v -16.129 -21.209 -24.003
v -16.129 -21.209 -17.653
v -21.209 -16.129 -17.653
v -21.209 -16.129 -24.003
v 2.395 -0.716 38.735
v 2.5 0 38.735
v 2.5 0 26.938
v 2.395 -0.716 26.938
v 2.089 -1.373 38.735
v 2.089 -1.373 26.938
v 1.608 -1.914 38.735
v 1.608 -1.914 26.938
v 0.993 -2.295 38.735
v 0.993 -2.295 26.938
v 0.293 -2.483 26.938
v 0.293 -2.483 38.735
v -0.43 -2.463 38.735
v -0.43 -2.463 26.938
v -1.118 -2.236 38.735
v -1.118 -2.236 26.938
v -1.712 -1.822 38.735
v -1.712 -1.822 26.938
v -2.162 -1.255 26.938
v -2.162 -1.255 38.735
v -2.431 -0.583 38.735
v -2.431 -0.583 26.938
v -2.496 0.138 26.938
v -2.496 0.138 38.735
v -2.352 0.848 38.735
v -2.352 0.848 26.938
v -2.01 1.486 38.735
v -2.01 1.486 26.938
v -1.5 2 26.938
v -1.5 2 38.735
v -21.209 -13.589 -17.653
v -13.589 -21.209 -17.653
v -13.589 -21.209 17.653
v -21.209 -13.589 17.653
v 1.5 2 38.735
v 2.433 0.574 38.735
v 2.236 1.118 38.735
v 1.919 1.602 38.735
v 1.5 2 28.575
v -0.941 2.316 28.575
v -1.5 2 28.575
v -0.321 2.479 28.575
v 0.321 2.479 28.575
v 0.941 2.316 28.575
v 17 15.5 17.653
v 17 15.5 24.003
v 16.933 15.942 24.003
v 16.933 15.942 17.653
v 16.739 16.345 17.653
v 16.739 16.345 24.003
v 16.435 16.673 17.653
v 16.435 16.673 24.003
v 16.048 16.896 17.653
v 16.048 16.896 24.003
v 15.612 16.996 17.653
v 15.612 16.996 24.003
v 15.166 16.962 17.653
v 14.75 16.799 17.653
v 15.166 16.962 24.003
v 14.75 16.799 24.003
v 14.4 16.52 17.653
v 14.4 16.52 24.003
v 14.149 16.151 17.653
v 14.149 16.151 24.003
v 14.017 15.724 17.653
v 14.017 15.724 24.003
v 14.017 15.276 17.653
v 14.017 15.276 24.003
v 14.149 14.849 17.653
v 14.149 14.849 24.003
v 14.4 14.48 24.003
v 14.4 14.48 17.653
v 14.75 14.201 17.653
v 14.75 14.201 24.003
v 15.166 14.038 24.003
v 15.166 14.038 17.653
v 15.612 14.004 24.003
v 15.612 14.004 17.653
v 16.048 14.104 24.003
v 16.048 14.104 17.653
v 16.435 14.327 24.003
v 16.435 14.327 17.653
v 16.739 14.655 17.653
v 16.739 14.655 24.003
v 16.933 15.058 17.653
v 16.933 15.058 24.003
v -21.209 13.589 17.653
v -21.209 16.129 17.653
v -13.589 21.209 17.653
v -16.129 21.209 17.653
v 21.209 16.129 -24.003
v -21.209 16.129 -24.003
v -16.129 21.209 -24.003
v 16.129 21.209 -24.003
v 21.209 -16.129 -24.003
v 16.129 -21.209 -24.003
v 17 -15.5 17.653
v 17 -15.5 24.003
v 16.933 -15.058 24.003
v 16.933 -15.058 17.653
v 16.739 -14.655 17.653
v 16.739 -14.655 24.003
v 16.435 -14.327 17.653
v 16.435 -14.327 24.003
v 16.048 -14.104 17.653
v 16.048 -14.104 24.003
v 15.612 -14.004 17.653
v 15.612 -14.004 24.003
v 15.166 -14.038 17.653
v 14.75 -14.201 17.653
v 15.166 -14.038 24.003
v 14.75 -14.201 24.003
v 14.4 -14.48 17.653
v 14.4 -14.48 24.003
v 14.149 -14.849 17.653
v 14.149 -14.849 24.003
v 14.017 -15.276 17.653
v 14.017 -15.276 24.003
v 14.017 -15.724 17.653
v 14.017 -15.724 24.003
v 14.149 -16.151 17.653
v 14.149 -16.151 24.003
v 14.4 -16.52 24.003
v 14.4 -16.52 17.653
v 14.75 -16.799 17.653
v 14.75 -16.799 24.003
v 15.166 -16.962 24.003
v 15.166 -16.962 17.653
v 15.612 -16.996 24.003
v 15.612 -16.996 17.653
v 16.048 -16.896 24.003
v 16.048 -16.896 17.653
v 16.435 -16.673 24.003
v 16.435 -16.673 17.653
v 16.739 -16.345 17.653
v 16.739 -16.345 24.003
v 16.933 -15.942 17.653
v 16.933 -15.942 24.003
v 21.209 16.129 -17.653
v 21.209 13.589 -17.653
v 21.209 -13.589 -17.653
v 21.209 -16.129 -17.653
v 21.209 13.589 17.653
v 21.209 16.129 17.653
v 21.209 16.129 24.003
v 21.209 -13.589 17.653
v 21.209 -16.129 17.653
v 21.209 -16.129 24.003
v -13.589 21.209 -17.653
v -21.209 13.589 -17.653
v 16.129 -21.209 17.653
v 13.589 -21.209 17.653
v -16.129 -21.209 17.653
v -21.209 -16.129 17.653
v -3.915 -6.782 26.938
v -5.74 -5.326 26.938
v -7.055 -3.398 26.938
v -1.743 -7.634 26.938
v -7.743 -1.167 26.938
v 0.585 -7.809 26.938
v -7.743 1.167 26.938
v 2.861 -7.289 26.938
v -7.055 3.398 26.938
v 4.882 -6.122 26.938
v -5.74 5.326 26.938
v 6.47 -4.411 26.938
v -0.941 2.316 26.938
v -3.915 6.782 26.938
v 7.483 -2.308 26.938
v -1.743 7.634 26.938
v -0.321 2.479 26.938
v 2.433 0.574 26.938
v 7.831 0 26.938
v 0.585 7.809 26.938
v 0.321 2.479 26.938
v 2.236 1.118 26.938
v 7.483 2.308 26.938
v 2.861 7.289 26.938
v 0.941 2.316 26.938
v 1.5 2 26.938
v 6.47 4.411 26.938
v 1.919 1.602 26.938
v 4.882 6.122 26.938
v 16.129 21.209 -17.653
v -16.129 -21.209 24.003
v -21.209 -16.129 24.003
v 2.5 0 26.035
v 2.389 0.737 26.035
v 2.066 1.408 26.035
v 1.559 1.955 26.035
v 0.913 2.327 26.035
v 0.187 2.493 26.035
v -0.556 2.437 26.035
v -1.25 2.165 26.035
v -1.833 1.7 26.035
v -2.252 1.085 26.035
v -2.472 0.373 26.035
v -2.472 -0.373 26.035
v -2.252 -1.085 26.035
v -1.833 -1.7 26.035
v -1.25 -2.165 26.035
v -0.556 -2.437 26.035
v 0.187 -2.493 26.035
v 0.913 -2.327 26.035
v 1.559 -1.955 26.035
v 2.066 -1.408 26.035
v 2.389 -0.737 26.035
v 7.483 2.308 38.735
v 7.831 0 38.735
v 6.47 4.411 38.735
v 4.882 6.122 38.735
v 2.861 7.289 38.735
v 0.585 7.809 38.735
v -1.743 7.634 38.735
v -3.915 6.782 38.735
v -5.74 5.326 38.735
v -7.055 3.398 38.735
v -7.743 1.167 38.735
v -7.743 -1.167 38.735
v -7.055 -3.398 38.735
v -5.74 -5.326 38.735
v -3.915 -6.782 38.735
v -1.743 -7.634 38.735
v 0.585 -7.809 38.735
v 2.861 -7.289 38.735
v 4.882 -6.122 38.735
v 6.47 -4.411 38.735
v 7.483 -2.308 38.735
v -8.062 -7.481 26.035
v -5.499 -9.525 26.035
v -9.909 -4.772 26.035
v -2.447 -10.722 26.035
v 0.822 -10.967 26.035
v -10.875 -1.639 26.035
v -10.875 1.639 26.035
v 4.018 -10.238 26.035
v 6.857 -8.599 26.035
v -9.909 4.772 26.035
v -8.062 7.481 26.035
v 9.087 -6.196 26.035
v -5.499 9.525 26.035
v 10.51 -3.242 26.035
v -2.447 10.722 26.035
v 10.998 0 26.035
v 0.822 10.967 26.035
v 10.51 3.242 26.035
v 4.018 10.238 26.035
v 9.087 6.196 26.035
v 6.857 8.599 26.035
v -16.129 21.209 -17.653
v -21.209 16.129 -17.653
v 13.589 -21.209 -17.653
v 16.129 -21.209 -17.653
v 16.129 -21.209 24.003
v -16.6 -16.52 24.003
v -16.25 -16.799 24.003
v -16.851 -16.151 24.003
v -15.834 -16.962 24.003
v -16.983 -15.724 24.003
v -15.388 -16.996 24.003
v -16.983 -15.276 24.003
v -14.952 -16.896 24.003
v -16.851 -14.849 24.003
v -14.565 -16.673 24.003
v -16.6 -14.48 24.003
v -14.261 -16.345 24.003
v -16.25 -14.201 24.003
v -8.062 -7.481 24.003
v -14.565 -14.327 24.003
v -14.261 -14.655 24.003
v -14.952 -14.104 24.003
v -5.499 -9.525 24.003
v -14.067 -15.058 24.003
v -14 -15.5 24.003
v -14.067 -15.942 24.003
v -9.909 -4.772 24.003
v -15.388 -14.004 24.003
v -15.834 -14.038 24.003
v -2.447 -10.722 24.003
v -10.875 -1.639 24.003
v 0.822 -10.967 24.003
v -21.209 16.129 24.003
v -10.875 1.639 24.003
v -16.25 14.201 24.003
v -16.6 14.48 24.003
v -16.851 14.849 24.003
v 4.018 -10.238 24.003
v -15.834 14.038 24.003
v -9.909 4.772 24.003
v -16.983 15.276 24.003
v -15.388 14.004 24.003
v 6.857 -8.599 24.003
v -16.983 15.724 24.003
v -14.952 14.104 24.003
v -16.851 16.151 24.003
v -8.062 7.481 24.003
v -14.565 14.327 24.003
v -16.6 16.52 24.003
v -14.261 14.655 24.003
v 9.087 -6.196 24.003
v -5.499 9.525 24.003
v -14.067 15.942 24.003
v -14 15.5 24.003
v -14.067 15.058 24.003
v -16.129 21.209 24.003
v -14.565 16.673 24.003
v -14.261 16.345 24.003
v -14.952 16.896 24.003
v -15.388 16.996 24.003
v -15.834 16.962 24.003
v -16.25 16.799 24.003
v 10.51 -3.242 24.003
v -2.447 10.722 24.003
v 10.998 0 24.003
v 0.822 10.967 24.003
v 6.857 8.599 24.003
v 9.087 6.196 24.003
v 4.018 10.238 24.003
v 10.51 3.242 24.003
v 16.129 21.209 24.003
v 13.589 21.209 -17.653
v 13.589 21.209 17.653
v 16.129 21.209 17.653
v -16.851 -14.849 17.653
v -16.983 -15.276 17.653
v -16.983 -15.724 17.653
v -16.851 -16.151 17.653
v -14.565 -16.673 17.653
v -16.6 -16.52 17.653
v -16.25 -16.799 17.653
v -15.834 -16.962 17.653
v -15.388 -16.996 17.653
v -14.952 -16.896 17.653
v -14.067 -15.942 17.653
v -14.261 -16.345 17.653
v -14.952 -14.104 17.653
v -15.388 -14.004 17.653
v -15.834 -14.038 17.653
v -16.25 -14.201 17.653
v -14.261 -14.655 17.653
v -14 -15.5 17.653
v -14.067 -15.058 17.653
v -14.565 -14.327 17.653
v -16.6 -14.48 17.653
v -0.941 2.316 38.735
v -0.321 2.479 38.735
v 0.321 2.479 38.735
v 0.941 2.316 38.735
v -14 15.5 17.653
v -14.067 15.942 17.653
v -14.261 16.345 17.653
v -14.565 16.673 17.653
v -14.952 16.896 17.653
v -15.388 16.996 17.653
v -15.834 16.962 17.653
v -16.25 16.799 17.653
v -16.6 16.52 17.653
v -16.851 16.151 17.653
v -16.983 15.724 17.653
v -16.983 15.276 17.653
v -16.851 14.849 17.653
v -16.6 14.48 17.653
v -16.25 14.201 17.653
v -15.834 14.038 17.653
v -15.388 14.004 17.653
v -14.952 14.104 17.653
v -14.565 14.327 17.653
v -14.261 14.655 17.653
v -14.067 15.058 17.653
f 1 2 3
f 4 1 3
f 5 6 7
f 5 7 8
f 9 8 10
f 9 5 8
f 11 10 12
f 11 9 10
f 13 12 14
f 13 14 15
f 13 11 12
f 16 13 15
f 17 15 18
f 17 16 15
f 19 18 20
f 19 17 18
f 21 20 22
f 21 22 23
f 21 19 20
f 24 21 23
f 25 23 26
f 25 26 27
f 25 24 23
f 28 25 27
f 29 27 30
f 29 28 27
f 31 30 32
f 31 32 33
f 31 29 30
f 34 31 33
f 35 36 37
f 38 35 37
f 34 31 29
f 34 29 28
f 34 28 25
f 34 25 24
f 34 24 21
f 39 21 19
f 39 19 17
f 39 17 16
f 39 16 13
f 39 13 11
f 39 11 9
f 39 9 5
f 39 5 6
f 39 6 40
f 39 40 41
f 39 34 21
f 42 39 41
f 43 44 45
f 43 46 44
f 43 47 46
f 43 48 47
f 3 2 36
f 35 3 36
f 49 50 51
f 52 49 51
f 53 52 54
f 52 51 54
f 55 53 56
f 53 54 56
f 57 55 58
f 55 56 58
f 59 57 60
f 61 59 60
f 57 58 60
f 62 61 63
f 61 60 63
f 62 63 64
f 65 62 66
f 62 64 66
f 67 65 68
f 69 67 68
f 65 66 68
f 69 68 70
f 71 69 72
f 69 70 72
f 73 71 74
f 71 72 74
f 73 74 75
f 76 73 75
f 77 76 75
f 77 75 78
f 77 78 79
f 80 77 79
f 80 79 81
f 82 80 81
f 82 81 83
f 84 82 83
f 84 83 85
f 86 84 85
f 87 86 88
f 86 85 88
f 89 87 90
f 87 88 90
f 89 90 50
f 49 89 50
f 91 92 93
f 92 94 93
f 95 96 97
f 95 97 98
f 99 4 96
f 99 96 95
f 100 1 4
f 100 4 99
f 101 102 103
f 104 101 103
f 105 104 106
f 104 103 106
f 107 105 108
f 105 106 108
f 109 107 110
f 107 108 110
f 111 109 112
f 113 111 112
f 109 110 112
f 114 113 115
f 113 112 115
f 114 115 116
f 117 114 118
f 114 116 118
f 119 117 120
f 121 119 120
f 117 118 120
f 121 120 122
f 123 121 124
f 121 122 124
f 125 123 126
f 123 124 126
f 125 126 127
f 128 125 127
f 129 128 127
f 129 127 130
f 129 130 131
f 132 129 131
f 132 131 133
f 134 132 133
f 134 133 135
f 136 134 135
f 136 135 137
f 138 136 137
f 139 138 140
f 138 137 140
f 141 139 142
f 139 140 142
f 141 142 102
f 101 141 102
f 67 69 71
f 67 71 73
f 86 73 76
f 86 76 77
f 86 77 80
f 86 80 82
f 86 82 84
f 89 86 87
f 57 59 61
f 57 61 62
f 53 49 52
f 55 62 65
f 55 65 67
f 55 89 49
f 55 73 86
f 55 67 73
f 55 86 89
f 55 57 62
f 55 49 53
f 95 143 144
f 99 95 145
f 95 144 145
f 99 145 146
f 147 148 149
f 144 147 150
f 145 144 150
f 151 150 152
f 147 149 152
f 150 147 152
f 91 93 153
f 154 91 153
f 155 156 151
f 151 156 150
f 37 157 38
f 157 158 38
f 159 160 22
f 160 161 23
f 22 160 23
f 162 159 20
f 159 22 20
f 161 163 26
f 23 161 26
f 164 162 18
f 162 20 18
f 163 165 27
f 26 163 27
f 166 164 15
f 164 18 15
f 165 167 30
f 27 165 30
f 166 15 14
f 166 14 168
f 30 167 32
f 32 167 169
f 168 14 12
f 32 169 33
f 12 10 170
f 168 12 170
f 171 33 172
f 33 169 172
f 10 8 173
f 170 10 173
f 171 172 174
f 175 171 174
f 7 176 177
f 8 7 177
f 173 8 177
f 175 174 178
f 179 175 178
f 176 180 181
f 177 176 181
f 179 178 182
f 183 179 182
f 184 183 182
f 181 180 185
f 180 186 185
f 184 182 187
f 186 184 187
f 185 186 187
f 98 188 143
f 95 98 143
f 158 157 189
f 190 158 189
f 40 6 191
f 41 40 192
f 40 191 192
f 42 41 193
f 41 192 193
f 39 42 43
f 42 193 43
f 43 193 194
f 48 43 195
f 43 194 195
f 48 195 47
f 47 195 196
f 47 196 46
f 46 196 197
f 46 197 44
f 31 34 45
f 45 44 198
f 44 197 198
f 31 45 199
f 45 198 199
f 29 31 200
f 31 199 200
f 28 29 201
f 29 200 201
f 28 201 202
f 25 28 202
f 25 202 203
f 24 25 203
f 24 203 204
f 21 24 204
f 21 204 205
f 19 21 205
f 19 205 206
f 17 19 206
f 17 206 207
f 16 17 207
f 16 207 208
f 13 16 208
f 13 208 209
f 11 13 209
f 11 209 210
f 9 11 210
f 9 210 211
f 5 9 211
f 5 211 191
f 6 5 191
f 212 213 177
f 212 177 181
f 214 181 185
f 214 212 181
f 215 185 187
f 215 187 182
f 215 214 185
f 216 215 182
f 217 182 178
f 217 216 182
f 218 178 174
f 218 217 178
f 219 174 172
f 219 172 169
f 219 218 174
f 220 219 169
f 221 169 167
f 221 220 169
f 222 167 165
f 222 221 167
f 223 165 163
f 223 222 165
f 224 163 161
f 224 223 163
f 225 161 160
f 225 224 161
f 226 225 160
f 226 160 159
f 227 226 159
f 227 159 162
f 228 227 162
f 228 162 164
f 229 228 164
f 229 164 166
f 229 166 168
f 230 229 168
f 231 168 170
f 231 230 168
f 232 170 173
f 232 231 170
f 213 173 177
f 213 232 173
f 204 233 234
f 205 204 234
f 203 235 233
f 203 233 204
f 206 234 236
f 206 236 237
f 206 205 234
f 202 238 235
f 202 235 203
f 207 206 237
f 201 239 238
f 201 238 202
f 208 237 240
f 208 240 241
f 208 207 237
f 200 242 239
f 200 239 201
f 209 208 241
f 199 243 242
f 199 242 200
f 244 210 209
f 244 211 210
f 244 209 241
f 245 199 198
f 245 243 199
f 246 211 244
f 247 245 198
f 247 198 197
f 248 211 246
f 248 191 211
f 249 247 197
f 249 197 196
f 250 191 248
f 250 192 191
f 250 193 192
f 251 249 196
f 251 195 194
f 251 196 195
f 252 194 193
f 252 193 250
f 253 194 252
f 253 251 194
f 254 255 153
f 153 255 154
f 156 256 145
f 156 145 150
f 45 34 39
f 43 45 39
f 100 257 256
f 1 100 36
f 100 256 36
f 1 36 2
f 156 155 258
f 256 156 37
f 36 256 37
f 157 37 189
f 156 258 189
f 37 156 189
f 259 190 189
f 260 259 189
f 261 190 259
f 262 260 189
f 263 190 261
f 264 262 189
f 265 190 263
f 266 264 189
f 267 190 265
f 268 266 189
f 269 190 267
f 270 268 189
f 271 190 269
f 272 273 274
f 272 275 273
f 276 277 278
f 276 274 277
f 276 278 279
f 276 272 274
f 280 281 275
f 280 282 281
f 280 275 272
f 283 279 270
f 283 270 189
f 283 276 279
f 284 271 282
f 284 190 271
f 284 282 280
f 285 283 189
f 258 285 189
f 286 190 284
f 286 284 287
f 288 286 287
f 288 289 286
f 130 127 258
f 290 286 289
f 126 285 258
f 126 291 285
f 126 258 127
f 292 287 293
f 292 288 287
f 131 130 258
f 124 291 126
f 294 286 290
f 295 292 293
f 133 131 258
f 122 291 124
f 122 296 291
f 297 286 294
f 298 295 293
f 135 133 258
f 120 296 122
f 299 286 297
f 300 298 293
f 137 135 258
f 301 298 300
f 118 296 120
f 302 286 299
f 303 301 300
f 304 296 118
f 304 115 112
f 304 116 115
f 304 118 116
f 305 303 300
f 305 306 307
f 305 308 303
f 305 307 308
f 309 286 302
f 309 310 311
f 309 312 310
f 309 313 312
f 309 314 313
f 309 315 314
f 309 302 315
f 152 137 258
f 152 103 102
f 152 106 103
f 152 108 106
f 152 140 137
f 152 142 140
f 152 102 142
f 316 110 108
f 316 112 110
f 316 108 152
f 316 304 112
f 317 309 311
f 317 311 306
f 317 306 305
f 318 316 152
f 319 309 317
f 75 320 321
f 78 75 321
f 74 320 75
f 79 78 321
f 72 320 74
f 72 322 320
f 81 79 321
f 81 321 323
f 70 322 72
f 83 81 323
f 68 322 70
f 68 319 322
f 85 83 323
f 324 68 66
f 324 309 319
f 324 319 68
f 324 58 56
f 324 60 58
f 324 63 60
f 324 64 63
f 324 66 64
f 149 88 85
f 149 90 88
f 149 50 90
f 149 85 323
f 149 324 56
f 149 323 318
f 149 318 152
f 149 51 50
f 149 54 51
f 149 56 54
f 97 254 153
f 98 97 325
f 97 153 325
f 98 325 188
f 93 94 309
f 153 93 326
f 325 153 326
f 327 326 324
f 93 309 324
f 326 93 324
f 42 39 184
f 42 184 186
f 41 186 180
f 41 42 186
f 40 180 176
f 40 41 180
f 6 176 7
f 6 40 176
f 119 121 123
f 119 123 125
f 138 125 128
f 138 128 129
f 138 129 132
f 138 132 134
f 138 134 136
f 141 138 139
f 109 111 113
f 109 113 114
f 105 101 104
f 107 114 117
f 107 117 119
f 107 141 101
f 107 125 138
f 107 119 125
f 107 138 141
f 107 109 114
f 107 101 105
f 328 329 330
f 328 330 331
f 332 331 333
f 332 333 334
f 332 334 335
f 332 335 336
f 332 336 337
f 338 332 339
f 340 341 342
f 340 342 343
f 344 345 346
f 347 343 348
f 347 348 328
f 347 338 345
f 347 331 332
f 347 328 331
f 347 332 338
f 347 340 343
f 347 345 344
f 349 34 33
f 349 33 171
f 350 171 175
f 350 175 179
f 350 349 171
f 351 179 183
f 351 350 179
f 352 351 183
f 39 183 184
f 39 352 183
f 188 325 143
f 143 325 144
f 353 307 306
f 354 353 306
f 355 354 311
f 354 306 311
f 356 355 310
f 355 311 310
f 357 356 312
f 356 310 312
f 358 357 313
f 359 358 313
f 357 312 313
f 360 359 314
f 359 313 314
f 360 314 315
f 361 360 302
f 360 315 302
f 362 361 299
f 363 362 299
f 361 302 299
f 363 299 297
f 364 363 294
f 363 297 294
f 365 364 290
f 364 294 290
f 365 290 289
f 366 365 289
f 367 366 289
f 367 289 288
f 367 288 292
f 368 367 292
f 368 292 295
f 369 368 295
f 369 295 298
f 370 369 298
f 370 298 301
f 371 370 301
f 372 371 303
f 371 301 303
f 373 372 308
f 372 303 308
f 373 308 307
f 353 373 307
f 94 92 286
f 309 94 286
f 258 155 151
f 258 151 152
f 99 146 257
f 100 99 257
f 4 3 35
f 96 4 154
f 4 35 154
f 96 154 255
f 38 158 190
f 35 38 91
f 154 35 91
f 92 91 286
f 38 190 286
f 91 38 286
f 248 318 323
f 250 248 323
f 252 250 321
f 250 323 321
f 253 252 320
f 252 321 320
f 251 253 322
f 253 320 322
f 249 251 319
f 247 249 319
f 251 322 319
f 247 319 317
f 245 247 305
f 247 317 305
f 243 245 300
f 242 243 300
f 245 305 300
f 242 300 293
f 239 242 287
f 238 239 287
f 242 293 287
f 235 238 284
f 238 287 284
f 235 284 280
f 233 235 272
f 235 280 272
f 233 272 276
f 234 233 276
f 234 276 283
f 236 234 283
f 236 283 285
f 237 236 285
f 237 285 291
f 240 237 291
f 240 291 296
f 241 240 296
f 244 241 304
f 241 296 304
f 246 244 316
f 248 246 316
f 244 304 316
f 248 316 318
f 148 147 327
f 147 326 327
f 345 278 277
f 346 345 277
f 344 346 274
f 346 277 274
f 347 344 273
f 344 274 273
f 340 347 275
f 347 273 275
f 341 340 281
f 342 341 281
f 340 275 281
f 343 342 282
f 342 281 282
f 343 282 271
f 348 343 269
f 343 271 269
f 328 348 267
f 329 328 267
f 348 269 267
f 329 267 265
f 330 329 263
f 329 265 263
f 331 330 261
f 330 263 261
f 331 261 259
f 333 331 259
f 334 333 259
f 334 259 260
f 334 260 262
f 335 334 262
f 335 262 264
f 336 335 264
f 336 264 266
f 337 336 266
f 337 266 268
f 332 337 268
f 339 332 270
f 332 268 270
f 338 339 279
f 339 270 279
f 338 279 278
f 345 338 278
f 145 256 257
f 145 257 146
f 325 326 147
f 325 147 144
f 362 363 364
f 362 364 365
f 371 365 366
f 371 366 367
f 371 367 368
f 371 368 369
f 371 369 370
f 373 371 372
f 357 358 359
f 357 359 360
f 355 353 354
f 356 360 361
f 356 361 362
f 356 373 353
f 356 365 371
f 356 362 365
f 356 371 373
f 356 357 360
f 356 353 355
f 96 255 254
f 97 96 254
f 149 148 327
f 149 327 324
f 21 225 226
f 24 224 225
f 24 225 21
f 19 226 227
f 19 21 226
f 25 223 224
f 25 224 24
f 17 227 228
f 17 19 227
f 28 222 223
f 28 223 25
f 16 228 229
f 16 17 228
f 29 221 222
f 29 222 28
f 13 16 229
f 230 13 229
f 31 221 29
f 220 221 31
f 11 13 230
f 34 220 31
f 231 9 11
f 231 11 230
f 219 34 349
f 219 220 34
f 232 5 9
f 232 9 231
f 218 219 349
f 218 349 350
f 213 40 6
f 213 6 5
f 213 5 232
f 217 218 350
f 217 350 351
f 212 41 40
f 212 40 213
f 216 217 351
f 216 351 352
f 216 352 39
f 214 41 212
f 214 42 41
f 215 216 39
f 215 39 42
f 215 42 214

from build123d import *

# Parameters (mm, degrees)
F0_W      = 42.418
F0_H      = 42.418
F1_DEPTH  = 17.653
F2_SIZE   = 7.62
F4_DEPTH  = 6.35
F5_SIZE   = 5.08
F7_DEPTH  = 6.35
F8_R      = 10.9982
F9_DEPTH  = 2.032
F10_R     = 2.5
F11_DEPTH = 12.7
F13_DEPTH = 10.16
F14_R     = 1.5
F15_DEPTH = 6.35
F16_R     = 7.8307434495
F17_DEPTH = 11.79723


with BuildPart() as f1:
    # F0 (on Top) → F1 (new body, symmetric)
    with BuildSketch(Plane.XY):
        Rectangle(F0_W, F0_H)
    extrude(amount=F1_DEPTH, both=True)

    # F2
    f2_edges = [f1.edges().sort_by_distance(p)[0] for p in [
        (21.209, 21.209, 0),
        (-21.209, 21.209, 0),
        (-21.209, -21.209, 0),
        (21.209, -21.209, 0),
    ]]
    chamfer(f2_edges, length=F2_SIZE)

    # F3 (on face) → F4 (join)
    with BuildSketch(Plane.XY.offset(17.653)):
        Polygon((13.589, 21.209), (-13.589, 21.209), (-21.209, 13.589), (-21.209, -13.589), (-13.589, -21.209), (13.589, -21.209), (21.209, -13.589), (21.209, 13.589), align=None)
        Polygon((21.209, 21.209), (13.589, 21.209), (21.209, 13.589), align=None)
        Polygon((-13.589, 21.209), (-21.209, 21.209), (-21.209, 13.589), align=None)
        Polygon((-13.589, -21.209), (-21.209, -13.589), (-21.209, -21.209), align=None)
        Polygon((21.209, -21.209), (21.209, -13.589), (13.589, -21.209), align=None)
    extrude(amount=F4_DEPTH)

    # F5
    f5_edges = [f1.edges().sort_by_distance(p)[0] for p in [
        (21.209, 21.209, 20.828),
        (-21.209, 21.209, 20.828),
        (-21.209, -21.209, 20.828),
        (21.209, -21.209, 20.828),
    ]]
    chamfer(f5_edges, length=F5_SIZE)

    # F6 (on face) → F7 (join)
    with BuildSketch(Plane(origin=(0, 0, -17.653), x_dir=(1, 0, 0), z_dir=(0, 0, -1))):
        Polygon((-13.589, 21.209), (-16.129, 21.209), (-21.209, 16.129), (-21.209, 13.589), align=None)
        Polygon((16.129, 21.209), (13.589, 21.209), (21.209, 13.589), (21.209, 16.129), align=None)
        Polygon((21.209, -16.129), (21.209, -13.589), (13.589, -21.209), (16.129, -21.209), align=None)
        Polygon((-13.589, -21.209), (-21.209, -13.589), (-21.209, -16.129), (-16.129, -21.209), align=None)
        Polygon((13.589, 21.209), (-13.589, 21.209), (-21.209, 13.589), (-21.209, -13.589), (-13.589, -21.209), (13.589, -21.209), (21.209, -13.589), (21.209, 13.589), align=None)
    extrude(amount=F7_DEPTH)

    # F8 (on face) → F9 (join)
    with BuildSketch(Plane.XY.offset(24.003)):
        Circle(F8_R)
    extrude(amount=F9_DEPTH)

    # F10 (on face) → F11 (join)
    with BuildSketch(Plane.XY.offset(26.035)):
        Circle(F10_R)
    extrude(amount=F11_DEPTH)

    # F12 (on face) → F13 (cut)
    with BuildSketch(Plane.XY.offset(38.735)):
        with BuildLine():
            Line((2.6203631624, 2.9334036984), (-2.6333660554, 2.9334036984))
            Line((-2.6333660554, 2.9334036984), (-2.6333660554, 2))
            Line((-2.6333660554, 2), (-1.5, 2))
            ThreePointArc((-1.5, 2), (0, 2.5), (1.5, 2))
            Line((1.5, 2), (2.6203631624, 2))
            Line((2.6203631624, 2), (2.6203631624, 2.9334036984))
        make_face()
        with BuildLine():
            ThreePointArc((1.5, 2), (0, 2.5), (-1.5, 2))
            Line((-1.5, 2), (1.5, 2))
        make_face()
    extrude(amount=-F13_DEPTH, mode=Mode.SUBTRACT)

    # F14 (on face) → F15 (cut)
    with BuildSketch(Plane.XY.offset(24.003)):
        with Locations((-15.5, 15.5)):
            Circle(F14_R)
        with Locations((15.5, 15.5)):
            Circle(F14_R)
        with Locations((15.5, -15.5)):
            Circle(F14_R)
        with Locations((-15.5, -15.5)):
            Circle(F14_R)
    extrude(amount=-F15_DEPTH, mode=Mode.SUBTRACT)


with BuildPart() as f17:
    # F16 (on face) → F17 (new body)
    with BuildSketch(Plane.XY.offset(38.735)):
        Circle(F16_R)
        with BuildLine():
            ThreePointArc((1.5, 2), (2.2360679775, 1.1180339887), (2.5, 0))
            ThreePointArc((2.5, 0), (-1.1180339887, -2.2360679775), (-1.5, 2))
            ThreePointArc((-1.5, 2), (0, 2.5), (1.5, 2))
        make_face(mode=Mode.SUBTRACT)
    extrude(amount=-F17_DEPTH)


solid = Compound([f1.part, f17.part])
